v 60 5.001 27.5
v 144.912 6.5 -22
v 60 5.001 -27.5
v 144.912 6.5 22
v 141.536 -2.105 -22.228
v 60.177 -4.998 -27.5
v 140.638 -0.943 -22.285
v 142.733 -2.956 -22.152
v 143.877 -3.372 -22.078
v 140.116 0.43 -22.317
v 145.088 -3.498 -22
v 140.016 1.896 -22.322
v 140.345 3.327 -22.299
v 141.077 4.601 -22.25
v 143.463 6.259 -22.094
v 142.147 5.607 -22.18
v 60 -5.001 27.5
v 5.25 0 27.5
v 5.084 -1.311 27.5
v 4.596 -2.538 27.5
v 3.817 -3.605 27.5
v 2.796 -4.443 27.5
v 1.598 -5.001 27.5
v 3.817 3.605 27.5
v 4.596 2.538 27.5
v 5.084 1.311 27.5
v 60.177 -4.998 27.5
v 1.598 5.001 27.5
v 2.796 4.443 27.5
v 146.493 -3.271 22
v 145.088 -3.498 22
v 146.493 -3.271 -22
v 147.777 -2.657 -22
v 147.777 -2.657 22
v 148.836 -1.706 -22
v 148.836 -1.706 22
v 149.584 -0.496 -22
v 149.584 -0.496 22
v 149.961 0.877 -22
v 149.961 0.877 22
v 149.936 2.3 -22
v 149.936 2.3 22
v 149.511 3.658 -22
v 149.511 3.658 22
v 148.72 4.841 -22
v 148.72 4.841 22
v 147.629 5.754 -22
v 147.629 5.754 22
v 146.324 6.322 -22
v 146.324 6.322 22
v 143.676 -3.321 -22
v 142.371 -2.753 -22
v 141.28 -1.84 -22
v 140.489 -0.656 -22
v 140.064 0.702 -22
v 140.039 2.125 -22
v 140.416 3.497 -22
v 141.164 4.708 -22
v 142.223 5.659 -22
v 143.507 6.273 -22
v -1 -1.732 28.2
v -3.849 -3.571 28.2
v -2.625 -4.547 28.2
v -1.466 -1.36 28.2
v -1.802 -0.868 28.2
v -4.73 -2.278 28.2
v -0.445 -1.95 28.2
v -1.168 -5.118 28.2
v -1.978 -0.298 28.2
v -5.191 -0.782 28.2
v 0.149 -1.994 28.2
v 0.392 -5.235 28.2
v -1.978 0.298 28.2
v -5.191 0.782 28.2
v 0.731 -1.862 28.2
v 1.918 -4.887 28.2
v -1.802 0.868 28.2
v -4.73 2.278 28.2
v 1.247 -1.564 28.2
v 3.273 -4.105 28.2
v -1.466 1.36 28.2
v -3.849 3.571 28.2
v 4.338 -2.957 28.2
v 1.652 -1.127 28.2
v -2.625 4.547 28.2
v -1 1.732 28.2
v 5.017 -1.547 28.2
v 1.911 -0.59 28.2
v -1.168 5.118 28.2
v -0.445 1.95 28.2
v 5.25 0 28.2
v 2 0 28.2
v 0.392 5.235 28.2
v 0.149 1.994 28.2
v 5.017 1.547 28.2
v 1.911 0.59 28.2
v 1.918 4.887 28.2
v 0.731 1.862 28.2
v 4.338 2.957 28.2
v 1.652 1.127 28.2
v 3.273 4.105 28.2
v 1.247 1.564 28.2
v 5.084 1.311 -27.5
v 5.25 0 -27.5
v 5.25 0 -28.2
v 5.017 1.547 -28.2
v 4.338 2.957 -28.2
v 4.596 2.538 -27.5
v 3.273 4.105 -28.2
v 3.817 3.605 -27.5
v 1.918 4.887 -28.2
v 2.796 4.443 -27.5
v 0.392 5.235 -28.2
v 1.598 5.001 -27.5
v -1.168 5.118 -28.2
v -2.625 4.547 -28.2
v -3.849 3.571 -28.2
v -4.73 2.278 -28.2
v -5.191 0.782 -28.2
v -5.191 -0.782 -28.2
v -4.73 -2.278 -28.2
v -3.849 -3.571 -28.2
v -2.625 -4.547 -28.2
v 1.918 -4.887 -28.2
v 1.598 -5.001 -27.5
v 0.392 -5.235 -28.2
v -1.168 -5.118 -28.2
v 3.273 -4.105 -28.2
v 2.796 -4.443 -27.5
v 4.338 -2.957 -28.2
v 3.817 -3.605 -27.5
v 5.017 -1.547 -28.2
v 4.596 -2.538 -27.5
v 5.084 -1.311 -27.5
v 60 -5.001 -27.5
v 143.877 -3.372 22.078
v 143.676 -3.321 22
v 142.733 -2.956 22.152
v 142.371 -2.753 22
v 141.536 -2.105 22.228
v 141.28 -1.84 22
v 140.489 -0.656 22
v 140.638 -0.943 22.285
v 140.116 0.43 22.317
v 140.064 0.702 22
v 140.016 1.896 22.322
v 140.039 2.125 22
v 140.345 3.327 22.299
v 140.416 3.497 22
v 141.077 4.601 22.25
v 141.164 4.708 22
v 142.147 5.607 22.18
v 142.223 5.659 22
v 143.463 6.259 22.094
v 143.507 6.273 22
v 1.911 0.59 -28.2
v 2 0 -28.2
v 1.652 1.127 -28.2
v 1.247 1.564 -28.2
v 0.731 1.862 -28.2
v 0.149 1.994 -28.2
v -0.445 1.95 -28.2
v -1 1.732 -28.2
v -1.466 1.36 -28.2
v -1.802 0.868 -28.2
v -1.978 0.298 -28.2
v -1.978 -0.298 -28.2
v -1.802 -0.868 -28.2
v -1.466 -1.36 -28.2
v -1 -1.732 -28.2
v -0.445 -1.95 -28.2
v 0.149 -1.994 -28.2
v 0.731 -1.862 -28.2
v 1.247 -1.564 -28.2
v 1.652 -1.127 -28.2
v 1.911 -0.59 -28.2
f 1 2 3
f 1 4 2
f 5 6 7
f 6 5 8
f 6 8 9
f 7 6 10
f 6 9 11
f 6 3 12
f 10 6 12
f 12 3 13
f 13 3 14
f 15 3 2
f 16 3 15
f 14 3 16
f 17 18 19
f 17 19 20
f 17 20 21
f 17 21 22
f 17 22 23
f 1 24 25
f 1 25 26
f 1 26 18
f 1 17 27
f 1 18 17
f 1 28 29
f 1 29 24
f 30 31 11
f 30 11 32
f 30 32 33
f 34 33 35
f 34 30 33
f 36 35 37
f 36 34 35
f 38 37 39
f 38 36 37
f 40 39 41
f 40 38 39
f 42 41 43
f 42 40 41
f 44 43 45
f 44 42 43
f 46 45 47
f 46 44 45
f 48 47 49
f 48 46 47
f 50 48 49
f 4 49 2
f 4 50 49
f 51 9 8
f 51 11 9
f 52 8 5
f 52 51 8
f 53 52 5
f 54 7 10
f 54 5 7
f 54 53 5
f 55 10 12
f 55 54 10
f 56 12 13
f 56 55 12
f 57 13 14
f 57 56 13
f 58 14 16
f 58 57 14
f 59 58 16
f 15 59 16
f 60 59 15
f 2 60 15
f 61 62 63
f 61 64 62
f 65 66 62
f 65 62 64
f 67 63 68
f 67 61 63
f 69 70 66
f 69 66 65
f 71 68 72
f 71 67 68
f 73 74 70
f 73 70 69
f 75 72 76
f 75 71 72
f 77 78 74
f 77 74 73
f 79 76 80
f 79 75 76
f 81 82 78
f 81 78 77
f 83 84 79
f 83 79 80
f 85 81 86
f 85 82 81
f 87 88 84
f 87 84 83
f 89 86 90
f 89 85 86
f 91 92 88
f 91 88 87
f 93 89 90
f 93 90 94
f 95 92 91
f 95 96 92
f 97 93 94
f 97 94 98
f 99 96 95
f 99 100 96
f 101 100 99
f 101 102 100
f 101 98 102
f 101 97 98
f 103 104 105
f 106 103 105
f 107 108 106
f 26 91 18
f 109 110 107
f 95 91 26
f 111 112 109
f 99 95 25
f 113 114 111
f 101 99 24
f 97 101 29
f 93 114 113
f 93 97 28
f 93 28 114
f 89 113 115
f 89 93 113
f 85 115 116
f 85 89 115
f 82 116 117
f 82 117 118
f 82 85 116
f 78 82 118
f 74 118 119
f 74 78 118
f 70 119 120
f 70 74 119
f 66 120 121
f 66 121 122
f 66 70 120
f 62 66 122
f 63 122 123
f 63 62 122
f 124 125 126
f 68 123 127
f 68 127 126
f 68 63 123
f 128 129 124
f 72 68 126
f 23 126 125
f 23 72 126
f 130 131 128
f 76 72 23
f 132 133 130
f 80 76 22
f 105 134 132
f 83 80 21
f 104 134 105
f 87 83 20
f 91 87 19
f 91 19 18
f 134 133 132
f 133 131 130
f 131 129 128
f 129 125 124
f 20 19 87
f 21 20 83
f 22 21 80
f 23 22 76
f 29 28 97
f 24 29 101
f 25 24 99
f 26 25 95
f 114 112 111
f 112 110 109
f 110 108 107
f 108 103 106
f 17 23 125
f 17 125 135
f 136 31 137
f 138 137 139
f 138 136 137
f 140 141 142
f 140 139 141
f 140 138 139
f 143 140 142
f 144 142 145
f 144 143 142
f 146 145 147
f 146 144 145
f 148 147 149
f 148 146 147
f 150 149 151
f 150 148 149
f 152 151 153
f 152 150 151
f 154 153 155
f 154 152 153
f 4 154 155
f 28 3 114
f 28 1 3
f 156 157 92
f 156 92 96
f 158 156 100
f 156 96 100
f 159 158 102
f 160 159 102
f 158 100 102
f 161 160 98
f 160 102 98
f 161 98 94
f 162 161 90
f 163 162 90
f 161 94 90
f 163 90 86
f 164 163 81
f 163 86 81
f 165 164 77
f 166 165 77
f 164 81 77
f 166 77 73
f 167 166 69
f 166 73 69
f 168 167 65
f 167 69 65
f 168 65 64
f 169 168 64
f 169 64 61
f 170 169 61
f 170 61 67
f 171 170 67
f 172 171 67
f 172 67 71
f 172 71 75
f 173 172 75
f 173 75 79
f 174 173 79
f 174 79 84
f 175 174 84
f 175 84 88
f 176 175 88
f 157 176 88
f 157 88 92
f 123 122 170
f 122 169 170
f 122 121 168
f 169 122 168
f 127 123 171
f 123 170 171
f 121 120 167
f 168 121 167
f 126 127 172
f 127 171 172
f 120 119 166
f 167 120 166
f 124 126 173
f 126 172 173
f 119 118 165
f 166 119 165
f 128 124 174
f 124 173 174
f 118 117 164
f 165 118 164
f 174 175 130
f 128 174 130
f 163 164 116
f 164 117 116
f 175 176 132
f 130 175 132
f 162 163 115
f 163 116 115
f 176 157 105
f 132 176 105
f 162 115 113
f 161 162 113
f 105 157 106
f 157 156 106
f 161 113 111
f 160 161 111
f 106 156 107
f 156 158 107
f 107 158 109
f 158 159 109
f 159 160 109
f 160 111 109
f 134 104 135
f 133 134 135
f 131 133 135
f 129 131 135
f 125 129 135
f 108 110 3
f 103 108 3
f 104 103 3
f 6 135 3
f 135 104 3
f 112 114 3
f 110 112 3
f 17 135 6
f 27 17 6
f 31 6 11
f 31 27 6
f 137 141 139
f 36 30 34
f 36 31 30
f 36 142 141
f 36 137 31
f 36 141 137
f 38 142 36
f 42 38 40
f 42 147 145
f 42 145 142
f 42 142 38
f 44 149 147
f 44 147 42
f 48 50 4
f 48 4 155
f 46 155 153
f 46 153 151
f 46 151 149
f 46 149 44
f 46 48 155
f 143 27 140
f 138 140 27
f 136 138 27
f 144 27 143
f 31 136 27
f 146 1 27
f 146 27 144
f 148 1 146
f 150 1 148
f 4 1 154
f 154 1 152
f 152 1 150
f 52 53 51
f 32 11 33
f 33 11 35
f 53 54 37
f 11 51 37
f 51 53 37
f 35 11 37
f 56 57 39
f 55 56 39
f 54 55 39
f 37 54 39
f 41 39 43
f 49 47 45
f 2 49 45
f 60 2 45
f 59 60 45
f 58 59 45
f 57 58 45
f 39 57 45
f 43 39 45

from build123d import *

# Parameters (mm, degrees)
RESSALTO_EXTRUS_O1_DEPTH = 28.2
RESSALTO_EXTRUS_O3_DEPTH = 22
RESSALTO_EXTRUS_O4_DEPTH = 27.5
RESSALTO_EXTRUS_O5_DEPTH = 27.5
CORTE_EXTRUS_O3_DEPTH    = 153.972464187
ESBO_O3_R                = 2
CORTE_EXTRUS_O4_DEPTH    = 161.384600668


with BuildPart() as part:
    # Esboço1 → Ressalto-extrusão1 (new, symmetric)
    with BuildSketch(Plane.XY):
        with BuildLine():
            ThreePointArc((5.25, 0), (4.239918087, 3.096061146), (1.598344907, 5.000779295))
            ThreePointArc((1.598344907, 5.000779295), (-5.25, 0), (1.598344907, -5.000779295))
            ThreePointArc((1.598344907, -5.000779295), (4.239918087, -3.096061146), (5.25, 0))
        make_face()
    extrude(amount=RESSALTO_EXTRUS_O1_DEPTH, both=True)

    # Esboço1<7> → Ressalto-extrusão4 (add, symmetric)
    with BuildSketch(Plane.XY):
        with BuildLine():
            Line((60, 5.000779295), (1.598344907, 5.000779295))
            ThreePointArc((1.598344907, 5.000779295), (4.239918087, 3.096061146), (5.25, 0))
            ThreePointArc((5.25, 0), (4.239918087, -3.096061146), (1.598344907, -5.000779295))
            Line((1.598344907, -5.000779295), (60, -5.000779295))
            Line((60, -5.000779295), (60, 5.000779295))
        make_face()
    extrude(amount=RESSALTO_EXTRUS_O4_DEPTH, both=True)



with BuildPart() as body_2:
    # Esboço1<5> → Ressalto-extrusão3 (new, symmetric)
    with BuildSketch(Plane.XY):
        with BuildLine():
            ThreePointArc((150, 1.500779295), (148.504187717, 5.067383905), (144.911732622, 6.500000121))
            ThreePointArc((144.911732622, 6.500000121), (140.000779174, 1.412511917), (145.088267378, -3.498441531))
            ThreePointArc((145.088267378, -3.498441531), (148.56660461, -2.003408422), (150, 1.500779295))
        make_face()
    extrude(amount=RESSALTO_EXTRUS_O3_DEPTH, both=True)


with BuildPart() as part_1:
    add(part.part)

    add(body_2.part)  # Ressalto-extrusão5 merges body 2
    # Esboço1<8> → Ressalto-extrusão5 (add, symmetric)
    with BuildSketch(Plane.XY):
        with BuildLine():
            Line((144.911732622, 6.500000121), (60, 5.000779295))
            Line((60, 5.000779295), (60, -5.000779295))
            Line((60, -5.000779295), (145.088267378, -3.498441531))
            ThreePointArc((145.088267378, -3.498441531), (140.000779174, 1.412511917), (144.911732622, 6.500000121))
        make_face()
    extrude(amount=RESSALTO_EXTRUS_O5_DEPTH, both=True)

    # Esboço2 → Corte-extrusão3 (cut, through all)
    with BuildSketch(Plane(origin=(-0.069568666, 3.940177355, 0), x_dir=(0.9998441652583014, 0.01765347554818762, 0), z_dir=(-0.017653475548187615, 0.9998441652583013, 0))):
        Polygon((60.078931051, -27.5), (145.003897933, -22), (145.003897933, -27.5), align=None)
        Polygon((60.078931051, 27.5), (145.003897933, 22), (145.003897933, 27.5), align=None)
    extrude(amount=-CORTE_EXTRUS_O3_DEPTH, mode=Mode.SUBTRACT)

    # Esboço3 → Corte-extrusão4 (cut, through all)
    with BuildSketch(Plane.XY.offset(28.2)):
        Circle(ESBO_O3_R)
    extrude(amount=-CORTE_EXTRUS_O4_DEPTH, mode=Mode.SUBTRACT)


solid = part_1.part
